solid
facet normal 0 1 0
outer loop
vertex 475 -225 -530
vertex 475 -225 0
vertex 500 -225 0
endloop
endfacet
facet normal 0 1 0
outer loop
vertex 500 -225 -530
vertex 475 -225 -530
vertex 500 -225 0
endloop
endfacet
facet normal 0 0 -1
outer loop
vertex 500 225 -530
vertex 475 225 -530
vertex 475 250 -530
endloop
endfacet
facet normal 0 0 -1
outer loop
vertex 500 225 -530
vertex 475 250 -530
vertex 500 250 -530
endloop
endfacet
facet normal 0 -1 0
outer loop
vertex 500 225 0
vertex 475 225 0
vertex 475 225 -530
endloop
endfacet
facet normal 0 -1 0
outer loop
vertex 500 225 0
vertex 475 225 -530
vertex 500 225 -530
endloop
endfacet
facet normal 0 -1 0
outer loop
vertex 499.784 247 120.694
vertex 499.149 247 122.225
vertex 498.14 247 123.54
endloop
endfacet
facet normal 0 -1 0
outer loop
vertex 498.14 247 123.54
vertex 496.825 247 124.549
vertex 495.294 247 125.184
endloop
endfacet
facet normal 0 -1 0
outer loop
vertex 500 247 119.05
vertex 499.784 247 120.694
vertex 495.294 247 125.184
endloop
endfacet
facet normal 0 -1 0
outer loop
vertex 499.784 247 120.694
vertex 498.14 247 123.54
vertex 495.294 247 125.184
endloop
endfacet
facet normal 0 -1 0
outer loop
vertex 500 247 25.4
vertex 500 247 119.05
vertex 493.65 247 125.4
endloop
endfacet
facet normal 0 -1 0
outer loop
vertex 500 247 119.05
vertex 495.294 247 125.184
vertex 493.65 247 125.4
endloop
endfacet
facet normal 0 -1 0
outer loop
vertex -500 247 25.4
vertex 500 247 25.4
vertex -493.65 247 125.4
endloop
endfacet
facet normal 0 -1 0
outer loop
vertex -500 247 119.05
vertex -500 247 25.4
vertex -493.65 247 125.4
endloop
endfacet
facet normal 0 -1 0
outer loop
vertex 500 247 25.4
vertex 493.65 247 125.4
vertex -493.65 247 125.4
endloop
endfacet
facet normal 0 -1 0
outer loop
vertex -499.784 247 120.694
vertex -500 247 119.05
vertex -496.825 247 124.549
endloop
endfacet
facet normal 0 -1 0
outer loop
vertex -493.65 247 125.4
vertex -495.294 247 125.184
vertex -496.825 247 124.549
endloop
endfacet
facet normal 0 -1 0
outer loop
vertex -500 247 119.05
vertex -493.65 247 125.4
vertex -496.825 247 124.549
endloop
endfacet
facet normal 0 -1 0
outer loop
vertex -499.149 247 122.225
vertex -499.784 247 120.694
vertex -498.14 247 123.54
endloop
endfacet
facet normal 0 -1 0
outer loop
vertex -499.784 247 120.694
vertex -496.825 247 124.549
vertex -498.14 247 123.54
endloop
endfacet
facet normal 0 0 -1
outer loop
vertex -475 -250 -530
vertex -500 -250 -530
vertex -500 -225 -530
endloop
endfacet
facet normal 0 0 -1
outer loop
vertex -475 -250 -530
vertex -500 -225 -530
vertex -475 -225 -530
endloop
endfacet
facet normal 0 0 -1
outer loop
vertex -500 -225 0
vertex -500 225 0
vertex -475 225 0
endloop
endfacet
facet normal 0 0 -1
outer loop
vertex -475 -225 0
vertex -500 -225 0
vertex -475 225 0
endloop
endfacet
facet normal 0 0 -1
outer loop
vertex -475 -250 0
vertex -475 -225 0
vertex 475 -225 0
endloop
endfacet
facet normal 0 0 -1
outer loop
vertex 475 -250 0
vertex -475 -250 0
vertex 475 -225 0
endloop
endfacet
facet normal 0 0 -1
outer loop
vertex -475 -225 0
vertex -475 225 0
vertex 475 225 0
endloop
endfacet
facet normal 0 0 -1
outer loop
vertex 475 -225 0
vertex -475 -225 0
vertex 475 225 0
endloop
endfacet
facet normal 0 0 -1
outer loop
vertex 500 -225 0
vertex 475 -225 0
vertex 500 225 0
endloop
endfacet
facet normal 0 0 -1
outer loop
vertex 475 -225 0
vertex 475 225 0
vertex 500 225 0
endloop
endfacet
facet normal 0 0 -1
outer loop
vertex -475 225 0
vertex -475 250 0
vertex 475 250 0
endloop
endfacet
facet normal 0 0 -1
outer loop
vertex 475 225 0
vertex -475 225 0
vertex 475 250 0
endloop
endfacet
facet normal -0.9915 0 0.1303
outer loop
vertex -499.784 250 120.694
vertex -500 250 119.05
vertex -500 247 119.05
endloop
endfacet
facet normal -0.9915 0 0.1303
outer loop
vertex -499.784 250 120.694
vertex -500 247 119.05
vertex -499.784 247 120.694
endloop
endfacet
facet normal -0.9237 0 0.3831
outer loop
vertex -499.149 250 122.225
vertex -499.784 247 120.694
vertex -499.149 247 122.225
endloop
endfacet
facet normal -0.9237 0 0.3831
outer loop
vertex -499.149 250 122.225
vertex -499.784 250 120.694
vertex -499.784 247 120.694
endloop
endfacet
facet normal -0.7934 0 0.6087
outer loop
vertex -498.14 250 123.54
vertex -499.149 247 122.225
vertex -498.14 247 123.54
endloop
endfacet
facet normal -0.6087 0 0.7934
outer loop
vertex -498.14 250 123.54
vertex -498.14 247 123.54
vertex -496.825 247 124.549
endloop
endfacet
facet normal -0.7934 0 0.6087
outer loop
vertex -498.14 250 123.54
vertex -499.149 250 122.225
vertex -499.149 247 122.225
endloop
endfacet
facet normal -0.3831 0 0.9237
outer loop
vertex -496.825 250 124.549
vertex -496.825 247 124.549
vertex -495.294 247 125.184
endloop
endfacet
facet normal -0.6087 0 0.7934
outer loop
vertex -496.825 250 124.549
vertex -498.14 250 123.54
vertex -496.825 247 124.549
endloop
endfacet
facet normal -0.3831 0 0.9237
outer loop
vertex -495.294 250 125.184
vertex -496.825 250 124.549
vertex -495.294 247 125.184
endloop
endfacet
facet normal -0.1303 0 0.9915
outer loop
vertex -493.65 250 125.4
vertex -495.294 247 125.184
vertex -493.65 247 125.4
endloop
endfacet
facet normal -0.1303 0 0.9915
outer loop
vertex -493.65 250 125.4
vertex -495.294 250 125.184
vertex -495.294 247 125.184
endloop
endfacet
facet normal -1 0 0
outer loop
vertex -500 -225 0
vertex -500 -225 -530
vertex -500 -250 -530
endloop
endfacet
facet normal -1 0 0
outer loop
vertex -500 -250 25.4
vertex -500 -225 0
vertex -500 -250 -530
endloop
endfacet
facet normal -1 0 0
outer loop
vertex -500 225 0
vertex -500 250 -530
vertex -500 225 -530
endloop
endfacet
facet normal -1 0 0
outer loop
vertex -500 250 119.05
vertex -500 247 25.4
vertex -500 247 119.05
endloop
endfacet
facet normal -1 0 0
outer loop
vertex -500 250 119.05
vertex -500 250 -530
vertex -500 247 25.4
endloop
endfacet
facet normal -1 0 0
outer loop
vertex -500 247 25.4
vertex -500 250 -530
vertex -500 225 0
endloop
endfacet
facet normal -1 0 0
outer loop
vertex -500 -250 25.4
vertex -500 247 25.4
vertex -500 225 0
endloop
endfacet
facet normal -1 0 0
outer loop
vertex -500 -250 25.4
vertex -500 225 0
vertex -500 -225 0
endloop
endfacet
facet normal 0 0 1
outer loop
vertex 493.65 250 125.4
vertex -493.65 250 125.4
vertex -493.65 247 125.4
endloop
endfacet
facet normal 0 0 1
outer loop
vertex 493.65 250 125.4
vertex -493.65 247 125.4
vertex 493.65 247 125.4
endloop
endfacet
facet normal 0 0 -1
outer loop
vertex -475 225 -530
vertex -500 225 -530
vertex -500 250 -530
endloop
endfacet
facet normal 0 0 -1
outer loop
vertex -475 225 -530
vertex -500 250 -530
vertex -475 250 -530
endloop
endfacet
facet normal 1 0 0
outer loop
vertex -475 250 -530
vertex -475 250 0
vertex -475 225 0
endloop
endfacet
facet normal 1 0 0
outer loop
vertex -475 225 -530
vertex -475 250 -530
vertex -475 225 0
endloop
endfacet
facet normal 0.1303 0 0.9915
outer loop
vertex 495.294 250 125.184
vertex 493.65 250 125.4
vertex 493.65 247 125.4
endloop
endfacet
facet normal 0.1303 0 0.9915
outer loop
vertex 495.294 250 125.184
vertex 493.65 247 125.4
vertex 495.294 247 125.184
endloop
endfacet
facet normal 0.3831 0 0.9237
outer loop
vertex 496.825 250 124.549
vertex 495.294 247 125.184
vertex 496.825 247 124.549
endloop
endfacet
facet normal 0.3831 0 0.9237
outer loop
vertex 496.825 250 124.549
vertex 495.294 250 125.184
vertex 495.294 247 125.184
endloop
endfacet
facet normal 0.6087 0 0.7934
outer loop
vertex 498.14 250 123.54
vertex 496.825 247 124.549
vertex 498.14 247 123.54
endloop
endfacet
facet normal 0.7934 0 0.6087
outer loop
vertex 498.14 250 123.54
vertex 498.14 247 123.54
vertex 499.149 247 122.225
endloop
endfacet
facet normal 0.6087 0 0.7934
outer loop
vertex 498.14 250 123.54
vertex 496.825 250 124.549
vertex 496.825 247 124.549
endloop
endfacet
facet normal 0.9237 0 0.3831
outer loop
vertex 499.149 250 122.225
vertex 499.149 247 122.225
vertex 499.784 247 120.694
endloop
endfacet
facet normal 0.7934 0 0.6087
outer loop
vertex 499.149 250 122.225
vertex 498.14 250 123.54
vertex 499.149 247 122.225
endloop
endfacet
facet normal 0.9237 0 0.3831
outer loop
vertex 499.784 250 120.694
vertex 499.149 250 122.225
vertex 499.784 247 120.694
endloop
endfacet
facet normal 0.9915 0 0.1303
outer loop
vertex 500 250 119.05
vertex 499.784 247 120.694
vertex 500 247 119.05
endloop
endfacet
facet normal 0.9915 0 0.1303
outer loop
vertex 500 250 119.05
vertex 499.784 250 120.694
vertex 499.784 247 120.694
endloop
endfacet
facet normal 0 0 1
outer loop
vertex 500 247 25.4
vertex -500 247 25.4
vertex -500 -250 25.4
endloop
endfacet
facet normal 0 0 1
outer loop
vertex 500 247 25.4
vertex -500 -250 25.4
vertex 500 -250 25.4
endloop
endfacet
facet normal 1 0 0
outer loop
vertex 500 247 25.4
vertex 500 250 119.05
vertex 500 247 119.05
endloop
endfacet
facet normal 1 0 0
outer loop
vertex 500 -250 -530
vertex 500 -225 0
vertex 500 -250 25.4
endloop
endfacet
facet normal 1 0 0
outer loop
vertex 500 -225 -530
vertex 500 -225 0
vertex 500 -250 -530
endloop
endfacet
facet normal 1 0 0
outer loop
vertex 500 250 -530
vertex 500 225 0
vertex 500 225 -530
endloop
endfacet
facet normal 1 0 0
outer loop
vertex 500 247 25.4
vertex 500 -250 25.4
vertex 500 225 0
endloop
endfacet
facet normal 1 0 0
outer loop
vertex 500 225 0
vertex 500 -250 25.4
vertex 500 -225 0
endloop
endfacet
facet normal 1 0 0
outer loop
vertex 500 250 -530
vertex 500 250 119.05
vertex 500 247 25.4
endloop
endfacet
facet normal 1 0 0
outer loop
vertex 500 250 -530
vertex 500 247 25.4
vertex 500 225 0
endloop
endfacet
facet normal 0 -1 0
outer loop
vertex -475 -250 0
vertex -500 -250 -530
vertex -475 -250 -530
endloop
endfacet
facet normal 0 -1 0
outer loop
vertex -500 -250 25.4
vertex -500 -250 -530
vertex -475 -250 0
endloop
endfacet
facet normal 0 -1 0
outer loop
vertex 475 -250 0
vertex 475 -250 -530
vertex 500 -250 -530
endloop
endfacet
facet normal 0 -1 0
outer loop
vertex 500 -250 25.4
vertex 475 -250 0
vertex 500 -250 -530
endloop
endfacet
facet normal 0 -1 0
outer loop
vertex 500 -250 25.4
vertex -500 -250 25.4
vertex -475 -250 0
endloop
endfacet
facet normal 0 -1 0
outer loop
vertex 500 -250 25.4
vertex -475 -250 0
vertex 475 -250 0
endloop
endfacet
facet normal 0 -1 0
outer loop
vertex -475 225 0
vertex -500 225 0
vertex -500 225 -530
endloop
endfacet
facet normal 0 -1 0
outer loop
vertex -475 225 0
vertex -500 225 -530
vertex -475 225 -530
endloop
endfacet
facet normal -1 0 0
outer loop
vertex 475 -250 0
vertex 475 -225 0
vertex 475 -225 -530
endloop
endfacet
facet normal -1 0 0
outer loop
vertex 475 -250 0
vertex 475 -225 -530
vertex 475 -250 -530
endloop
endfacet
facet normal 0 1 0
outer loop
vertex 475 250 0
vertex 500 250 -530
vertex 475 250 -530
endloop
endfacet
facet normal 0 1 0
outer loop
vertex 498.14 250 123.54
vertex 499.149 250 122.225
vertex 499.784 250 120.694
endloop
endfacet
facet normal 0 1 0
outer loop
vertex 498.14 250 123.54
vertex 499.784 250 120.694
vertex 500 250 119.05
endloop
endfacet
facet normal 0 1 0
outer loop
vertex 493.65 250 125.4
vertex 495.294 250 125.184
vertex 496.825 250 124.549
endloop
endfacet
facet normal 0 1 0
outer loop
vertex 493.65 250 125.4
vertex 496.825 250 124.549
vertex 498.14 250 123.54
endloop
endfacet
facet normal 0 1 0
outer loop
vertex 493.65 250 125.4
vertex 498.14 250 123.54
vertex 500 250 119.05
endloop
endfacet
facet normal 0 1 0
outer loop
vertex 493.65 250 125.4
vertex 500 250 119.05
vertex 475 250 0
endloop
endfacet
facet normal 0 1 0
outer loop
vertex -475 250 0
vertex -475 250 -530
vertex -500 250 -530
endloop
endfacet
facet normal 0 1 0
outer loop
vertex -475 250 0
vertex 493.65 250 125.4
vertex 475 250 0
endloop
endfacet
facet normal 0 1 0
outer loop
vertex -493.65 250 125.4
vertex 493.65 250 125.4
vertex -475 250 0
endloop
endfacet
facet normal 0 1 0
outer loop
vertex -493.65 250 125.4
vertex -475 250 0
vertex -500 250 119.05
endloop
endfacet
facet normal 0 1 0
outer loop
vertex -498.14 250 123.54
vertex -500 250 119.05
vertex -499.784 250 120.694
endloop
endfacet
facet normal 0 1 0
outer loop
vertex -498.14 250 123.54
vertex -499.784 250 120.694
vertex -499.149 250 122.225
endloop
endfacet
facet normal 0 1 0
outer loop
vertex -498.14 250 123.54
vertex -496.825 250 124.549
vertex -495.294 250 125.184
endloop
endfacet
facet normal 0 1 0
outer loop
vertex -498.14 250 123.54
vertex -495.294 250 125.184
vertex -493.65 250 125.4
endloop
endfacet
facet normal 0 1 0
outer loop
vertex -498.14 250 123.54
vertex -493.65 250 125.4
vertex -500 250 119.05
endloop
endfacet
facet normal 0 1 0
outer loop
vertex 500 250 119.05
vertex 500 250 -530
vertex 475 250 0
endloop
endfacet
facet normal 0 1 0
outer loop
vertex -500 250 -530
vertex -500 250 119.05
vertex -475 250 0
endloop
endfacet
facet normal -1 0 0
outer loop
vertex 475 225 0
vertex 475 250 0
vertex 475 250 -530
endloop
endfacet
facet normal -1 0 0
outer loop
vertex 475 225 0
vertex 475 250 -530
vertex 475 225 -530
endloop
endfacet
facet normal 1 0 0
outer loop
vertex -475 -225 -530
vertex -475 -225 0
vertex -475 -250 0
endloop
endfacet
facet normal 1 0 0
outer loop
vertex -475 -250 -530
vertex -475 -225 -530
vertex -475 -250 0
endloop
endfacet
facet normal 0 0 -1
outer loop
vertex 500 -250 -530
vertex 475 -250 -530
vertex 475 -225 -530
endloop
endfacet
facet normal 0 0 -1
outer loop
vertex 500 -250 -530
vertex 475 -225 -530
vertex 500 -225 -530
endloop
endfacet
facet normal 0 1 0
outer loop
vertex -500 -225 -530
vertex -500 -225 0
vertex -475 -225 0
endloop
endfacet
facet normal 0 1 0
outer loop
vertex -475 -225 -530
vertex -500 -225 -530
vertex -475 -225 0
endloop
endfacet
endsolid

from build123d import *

# Parameters (mm, degrees)
F0_W     = 1000
F0_H     = 500
F1_DEPTH = 25.4
F2_W     = 25
F2_H     = 25
F3_DEPTH = 530
F5_DEPTH = 3


with BuildPart() as f1:
    # F0 (on Top) → F1 (new body)
    with BuildSketch(Plane.XY):
        Rectangle(F0_W, F0_H)
    extrude(amount=F1_DEPTH)

    # F2 (on face) → F3 (join)
    with BuildSketch(Plane(origin=(0, 0, 0), x_dir=(1, 0, 0), z_dir=(0, 0, -1))):
        with Locations((-487.5, 237.5)):
            Rectangle(F2_W, F2_H)
        with Locations((-487.5, -237.5)):
            Rectangle(F2_W, F2_H)
        with Locations((487.5, 237.5)):
            Rectangle(F2_W, F2_H)
        with Locations((487.5, -237.5)):
            Rectangle(F2_W, F2_H)
    extrude(amount=F3_DEPTH)

    # F4 (on face) → F5 (join)
    with BuildSketch(Plane(origin=(0, 250, 0), x_dir=(-1, 0, 0), z_dir=(0, 1, 0))):
        with BuildLine():
            Line((-500, 119.05), (-500, 25.4))
            Line((-500, 25.4), (500, 25.4))
            Line((500, 25.4), (500, 119.05))
            ThreePointArc((500, 119.05), (498.140128, 123.540128), (493.65, 125.4))
            Line((493.65, 125.4), (-493.65, 125.4))
            ThreePointArc((-493.65, 125.4), (-498.140128, 123.540128), (-500, 119.05))
        make_face()
    extrude(amount=-F5_DEPTH)


solid = f1.part
